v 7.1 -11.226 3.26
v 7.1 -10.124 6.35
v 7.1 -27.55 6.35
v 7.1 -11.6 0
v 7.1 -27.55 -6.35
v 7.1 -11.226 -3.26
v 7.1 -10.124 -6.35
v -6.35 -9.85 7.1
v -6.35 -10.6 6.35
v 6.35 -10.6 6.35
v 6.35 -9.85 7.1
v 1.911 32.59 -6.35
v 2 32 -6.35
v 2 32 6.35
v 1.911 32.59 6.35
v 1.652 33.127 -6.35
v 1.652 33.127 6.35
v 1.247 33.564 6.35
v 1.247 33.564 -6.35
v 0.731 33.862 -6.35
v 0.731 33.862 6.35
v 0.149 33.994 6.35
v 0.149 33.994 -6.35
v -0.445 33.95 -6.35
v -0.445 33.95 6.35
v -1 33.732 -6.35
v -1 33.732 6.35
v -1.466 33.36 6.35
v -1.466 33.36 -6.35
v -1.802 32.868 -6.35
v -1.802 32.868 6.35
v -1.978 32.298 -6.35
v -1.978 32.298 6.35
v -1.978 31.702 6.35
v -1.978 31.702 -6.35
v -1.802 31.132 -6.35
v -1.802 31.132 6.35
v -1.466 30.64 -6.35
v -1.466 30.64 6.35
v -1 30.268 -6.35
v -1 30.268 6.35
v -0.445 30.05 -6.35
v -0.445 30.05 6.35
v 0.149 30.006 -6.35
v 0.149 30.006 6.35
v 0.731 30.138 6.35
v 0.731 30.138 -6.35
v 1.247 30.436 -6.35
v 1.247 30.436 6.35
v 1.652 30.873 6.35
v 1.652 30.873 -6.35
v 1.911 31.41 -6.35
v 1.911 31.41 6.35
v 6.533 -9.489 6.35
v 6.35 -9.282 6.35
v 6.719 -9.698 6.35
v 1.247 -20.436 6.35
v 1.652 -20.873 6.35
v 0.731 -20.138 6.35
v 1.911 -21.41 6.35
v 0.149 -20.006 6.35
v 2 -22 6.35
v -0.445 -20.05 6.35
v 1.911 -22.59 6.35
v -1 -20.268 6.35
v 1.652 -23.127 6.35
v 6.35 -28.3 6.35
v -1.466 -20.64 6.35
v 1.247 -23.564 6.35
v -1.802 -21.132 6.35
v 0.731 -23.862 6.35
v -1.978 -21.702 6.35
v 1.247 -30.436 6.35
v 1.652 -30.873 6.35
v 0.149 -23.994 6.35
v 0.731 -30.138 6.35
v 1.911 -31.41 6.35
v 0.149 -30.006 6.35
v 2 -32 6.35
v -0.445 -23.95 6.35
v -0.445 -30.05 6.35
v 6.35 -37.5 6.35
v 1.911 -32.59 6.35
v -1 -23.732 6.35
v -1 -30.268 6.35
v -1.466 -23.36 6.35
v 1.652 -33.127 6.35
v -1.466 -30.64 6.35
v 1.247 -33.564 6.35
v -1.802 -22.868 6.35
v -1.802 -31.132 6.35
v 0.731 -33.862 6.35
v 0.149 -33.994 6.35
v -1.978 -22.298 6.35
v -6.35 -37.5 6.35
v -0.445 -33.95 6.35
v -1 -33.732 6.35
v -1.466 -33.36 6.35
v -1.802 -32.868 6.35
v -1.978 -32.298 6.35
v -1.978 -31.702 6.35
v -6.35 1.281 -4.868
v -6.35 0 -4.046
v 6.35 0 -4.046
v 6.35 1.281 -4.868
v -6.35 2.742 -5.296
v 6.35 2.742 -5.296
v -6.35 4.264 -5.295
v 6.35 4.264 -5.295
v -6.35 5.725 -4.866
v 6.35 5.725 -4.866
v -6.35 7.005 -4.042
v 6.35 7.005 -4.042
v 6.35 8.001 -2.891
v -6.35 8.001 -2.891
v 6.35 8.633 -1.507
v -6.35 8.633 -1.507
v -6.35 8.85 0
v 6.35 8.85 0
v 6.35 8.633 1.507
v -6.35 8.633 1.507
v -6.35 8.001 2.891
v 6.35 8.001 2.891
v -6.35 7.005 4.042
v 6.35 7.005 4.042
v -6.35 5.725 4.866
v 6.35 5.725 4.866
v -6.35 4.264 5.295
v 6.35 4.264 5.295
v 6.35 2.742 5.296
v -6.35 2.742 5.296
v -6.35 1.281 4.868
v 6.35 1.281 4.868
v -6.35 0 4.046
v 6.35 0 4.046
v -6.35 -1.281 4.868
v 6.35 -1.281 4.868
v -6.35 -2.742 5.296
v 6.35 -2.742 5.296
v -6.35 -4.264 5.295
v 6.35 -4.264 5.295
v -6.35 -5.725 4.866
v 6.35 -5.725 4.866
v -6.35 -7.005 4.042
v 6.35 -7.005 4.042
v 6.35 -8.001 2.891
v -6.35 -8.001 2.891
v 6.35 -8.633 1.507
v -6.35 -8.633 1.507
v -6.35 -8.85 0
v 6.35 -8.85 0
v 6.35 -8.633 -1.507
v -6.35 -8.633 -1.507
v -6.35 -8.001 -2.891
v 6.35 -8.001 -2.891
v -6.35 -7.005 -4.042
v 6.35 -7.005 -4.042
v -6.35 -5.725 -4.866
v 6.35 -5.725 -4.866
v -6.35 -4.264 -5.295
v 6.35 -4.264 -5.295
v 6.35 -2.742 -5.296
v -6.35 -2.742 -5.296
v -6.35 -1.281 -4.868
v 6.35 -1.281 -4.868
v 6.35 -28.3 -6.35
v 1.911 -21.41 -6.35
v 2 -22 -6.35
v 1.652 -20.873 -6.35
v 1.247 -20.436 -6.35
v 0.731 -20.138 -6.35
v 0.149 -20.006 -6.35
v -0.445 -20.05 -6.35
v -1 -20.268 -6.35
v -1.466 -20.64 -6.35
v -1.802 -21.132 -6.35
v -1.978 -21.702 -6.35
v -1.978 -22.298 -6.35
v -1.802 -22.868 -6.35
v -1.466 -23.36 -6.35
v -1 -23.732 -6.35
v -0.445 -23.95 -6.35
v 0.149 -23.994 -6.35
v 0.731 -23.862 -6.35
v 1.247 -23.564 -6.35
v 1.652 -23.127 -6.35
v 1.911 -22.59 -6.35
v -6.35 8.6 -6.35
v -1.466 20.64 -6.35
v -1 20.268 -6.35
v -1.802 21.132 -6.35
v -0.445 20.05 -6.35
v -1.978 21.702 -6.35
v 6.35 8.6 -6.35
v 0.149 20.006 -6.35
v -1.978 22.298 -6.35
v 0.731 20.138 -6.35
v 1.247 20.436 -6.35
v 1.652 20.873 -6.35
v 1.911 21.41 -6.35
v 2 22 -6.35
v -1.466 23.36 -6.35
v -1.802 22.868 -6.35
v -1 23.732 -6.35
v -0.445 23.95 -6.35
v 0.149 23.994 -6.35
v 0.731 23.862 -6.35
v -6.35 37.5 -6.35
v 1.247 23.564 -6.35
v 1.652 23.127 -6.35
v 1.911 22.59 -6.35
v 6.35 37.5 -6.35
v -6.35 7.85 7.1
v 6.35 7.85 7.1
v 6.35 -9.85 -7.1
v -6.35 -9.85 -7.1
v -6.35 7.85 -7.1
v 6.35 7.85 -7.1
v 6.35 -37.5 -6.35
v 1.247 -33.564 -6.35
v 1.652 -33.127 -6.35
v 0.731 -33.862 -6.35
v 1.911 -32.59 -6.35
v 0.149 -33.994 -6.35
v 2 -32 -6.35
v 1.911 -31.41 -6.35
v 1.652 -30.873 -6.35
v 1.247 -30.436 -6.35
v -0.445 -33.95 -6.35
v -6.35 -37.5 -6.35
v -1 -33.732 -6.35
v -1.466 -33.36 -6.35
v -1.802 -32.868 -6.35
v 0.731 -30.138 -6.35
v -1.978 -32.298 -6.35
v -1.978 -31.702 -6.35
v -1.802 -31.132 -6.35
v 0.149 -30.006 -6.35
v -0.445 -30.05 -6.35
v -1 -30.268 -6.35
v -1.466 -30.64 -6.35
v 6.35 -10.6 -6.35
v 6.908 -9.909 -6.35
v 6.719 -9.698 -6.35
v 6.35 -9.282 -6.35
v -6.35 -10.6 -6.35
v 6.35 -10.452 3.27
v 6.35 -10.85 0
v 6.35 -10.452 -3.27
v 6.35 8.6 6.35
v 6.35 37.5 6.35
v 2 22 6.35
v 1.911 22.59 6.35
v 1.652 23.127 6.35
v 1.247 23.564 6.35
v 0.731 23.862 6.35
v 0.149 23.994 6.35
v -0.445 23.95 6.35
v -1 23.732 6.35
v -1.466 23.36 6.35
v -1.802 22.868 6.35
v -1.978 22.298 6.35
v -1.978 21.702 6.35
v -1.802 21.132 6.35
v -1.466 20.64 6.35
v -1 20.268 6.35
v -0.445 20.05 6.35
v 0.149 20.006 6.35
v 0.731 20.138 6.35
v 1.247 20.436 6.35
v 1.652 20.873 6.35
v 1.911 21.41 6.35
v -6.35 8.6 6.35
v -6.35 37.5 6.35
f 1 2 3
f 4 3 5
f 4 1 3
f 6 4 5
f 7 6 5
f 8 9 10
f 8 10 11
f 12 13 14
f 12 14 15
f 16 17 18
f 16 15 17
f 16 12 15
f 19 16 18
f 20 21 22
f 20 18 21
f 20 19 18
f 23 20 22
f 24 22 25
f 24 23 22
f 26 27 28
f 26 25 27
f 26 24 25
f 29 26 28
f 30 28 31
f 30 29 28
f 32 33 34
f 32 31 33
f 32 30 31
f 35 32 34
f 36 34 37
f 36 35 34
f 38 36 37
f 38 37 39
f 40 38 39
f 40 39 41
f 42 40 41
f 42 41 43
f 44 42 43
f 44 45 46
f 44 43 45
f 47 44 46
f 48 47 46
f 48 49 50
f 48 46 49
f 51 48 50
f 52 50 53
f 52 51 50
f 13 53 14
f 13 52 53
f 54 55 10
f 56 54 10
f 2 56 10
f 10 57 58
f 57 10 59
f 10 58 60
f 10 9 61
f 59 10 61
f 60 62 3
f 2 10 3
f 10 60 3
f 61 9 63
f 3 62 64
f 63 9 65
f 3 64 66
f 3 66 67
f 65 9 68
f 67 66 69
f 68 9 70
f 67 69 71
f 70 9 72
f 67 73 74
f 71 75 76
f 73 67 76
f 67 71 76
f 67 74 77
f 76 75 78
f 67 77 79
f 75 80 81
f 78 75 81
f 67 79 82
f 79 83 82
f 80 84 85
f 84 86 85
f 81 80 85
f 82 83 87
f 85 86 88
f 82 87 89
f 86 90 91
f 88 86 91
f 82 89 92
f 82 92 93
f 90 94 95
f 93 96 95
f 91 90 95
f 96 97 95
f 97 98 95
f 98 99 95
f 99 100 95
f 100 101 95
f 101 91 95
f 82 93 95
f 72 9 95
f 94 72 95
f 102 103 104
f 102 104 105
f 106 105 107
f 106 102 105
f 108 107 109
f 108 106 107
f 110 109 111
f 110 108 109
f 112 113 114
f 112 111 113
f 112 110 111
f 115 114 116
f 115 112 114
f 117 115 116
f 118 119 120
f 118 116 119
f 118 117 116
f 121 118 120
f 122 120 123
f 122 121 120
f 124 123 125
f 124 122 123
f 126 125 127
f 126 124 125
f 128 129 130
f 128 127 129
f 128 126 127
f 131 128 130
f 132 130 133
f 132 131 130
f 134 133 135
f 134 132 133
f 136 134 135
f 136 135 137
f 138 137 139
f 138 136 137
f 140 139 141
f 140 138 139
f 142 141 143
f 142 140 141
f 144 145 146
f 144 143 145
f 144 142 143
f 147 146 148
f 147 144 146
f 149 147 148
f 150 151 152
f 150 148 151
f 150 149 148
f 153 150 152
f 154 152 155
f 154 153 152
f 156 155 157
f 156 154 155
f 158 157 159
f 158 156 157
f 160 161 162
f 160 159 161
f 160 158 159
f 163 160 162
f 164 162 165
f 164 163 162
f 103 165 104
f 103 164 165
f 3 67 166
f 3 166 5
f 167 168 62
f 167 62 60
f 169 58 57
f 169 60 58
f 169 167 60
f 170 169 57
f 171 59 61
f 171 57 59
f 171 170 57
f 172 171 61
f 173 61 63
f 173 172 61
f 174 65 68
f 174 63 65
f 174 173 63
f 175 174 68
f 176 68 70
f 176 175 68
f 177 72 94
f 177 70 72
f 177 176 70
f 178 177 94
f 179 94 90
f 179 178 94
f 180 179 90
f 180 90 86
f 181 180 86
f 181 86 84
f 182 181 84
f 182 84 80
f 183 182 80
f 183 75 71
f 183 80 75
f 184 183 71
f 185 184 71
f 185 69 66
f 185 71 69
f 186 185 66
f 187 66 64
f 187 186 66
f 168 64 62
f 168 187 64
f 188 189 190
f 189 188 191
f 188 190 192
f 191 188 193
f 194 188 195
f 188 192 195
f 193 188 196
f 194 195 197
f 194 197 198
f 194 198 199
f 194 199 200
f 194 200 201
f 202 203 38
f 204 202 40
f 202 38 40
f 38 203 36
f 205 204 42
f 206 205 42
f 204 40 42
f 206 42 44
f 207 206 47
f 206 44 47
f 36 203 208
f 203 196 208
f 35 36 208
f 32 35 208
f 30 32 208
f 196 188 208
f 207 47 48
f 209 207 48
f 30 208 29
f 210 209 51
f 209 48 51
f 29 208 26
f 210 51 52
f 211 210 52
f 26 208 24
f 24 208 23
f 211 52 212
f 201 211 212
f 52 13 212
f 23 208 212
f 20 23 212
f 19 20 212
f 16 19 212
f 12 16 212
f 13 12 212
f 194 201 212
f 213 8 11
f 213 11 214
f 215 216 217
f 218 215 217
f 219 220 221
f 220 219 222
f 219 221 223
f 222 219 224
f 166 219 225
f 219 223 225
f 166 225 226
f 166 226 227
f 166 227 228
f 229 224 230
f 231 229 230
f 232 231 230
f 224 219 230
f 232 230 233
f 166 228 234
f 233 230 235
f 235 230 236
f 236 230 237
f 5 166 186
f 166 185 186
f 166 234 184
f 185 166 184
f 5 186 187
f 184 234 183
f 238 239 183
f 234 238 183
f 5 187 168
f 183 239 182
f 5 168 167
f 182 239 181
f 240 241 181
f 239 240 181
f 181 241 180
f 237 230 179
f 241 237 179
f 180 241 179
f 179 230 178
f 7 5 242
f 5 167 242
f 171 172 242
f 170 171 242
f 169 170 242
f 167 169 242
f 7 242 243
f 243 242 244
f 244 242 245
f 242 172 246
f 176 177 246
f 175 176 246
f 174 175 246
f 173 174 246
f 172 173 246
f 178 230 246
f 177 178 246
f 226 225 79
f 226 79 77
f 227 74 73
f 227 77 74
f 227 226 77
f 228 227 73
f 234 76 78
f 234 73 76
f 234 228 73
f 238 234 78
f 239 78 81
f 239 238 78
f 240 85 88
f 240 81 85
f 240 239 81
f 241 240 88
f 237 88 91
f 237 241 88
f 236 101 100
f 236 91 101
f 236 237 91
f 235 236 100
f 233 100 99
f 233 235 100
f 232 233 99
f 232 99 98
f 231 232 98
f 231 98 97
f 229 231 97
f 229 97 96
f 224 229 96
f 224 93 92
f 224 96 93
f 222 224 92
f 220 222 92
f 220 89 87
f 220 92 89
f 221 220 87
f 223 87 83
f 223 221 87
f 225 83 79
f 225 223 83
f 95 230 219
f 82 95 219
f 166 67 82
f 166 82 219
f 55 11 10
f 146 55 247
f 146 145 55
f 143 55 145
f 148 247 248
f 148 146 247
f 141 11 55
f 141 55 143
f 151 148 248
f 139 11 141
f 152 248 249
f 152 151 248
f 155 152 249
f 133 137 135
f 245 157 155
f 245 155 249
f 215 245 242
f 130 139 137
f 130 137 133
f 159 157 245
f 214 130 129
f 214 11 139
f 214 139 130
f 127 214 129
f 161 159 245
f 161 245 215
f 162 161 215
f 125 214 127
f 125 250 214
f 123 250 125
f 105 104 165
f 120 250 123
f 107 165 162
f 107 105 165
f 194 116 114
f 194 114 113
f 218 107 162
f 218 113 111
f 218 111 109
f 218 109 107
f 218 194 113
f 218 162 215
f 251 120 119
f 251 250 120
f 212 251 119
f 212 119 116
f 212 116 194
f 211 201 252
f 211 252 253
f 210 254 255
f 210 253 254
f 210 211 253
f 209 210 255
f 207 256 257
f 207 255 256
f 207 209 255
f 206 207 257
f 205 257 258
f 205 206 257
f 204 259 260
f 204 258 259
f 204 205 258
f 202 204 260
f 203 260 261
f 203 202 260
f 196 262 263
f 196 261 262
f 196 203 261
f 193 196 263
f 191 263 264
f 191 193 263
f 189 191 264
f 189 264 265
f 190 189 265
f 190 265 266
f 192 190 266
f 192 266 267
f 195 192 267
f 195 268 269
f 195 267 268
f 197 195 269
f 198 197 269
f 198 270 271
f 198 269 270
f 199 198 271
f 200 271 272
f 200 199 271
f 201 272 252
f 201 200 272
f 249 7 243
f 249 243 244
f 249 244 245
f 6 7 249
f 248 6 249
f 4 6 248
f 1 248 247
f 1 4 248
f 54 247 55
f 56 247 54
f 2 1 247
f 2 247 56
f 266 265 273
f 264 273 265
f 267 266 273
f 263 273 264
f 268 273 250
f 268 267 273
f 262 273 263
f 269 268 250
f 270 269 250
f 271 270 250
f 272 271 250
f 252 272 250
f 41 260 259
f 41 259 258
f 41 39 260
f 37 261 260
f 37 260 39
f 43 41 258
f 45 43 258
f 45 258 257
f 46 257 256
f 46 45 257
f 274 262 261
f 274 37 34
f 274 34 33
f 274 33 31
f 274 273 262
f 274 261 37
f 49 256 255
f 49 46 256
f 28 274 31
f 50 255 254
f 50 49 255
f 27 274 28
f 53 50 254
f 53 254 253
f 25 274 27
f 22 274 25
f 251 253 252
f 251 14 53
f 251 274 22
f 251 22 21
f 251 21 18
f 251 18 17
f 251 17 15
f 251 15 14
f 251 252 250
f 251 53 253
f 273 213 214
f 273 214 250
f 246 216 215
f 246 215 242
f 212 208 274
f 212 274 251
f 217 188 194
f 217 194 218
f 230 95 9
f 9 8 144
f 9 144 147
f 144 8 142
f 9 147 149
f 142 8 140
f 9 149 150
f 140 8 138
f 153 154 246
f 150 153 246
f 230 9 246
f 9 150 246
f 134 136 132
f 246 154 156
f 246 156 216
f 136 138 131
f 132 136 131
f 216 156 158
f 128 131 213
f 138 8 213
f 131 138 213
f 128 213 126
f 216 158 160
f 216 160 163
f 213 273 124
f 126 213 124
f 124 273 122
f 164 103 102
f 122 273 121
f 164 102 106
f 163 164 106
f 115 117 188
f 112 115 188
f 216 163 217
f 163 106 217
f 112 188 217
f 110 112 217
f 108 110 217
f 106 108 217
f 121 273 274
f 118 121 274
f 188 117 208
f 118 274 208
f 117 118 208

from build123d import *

# Parameters (mm, degrees)
SKETCH1_W               = 12.7
SKETCH1_H               = 12.7
BOSS_EXTRUDE1_DEPTH     = 37.5
CUT_EXTRUDE1_DEPTH      = 39.560277489
CUT_EXTRUDE1_DEPTH_BACK = 39.560277489
BOSS_EXTRUDE2_START     = -6.35
SKETCH3_W               = 0.75
SKETCH3_H               = 21.7
BOSS_EXTRUDE2_DEPTH     = 12.7
BOSS_EXTRUDE3_DEPTH     = 0.75
CHAMFER1_SIZE           = 2
CUT_EXTRUDE2_DEPTH      = 39.820999472
CUT_EXTRUDE2_DEPTH_BACK = 39.820999472
SKETCH5_R               = 2


with BuildPart() as part:
    # Sketch1 → Boss-Extrude1 (new, symmetric)
    with BuildSketch(Plane(origin=(0, 0, 0), x_dir=(1, 0, 0), z_dir=(0, 1, 0))):
        Rectangle(SKETCH1_W, SKETCH1_H)
    extrude(amount=BOSS_EXTRUDE1_DEPTH, both=True)

    # Sketch2 → Cut-Extrude1 (cut, two sides: drawn at the far end of the back side and taken through both)
    with BuildSketch(Plane(origin=(0, 0, 0), x_dir=(0, 0, -1), z_dir=(1, 0, 0)).offset(-CUT_EXTRUDE1_DEPTH_BACK)):
        with BuildLine():
            ThreePointArc((4.046294601, 0), (0, 8.85), (-4.046294601, 0))
            ThreePointArc((-4.046294601, 0), (0, -8.85), (4.046294601, 0))
        make_face()
    extrude(amount=CUT_EXTRUDE1_DEPTH + CUT_EXTRUDE1_DEPTH_BACK, mode=Mode.SUBTRACT)

    # Sketch3 → Boss-Extrude2 (add)
    with BuildSketch(Plane(origin=(0, 0, 0), x_dir=(0, 0, -1), z_dir=(1, 0, 0)).offset(BOSS_EXTRUDE2_START)):
        with Locations((6.725, -1)):
            Rectangle(SKETCH3_W, SKETCH3_H)
        with Locations((-6.725, -1)):
            Rectangle(SKETCH3_W, SKETCH3_H)
    extrude(amount=BOSS_EXTRUDE2_DEPTH)

    # Sketch4 → Boss-Extrude3 (add)
    with BuildSketch(Plane(origin=(6.35, 0, 0), x_dir=(0, 0, -1), z_dir=(1, 0, 0))):
        with BuildLine():
            Line((-6.35, -7.85), (-6.35, -29.55))
            Line((-6.35, -29.55), (6.35, -29.55))
            Line((6.35, -29.55), (6.35, -7.85))
            ThreePointArc((6.35, -7.85), (0, -9.6), (-6.35, -7.85))
        make_face()
    extrude(amount=BOSS_EXTRUDE3_DEPTH)

    # Chamfer1
    # the kernel refuses this chamfer: 2 mm, written as the material it takes off along each edge
    with BuildSketch(Plane(origin=(7.1, -29.55, 11.493365976), x_dir=(-0.9996219169112968, -0.027495876610585623, 0), z_dir=(0, 0, -1))) as chamfer1_piece_1_section:
        Polygon((CHAMFER1_SIZE * 0.999621916911, CHAMFER1_SIZE * 0.0274958766106), (-CHAMFER1_SIZE * 0.0274958766106, CHAMFER1_SIZE * 0.999621916911), (0, 0), align=None)
    chamfer1_piece_1 = extrude(amount=22.986731952, mode=Mode.PRIVATE)
    chamfer1_piece_1 = split(chamfer1_piece_1, bisect_by=Plane(origin=(6.35, -28.711332072, 0), z_dir=(1, 0, 0)), keep=Keep.TOP, mode=Mode.PRIVATE)
    add(chamfer1_piece_1, mode=Mode.SUBTRACT)
    with BuildSketch(Plane(origin=(7.1, 2.795714286, 0), x_dir=(0, -0.5793710900712427, -0.8150638870601863), z_dir=(0, 0.8150638870601863, -0.5793710900712427))) as chamfer1_piece_2_section:
        Polygon((12.395714286, CHAMFER1_SIZE), (12.395714286 + CHAMFER1_SIZE, 0), (12.395714286, 0), align=None)
    chamfer1_piece_2 = revolve(axis=Axis((7.1, 2.795714286, 0), (-1, 0, 0)), revolution_arc=109.187358772, mode=Mode.PRIVATE)
    chamfer1_piece_2 = split(chamfer1_piece_2, bisect_by=Plane(origin=(6.35, -11.230390822, 0), z_dir=(1, 0, 0)), keep=Keep.TOP, mode=Mode.PRIVATE)
    add(chamfer1_piece_2, mode=Mode.SUBTRACT)
    with BuildSketch(Plane(origin=(-11.493365976, -11.85, -7.1), x_dir=(0, 0.9996219169112968, -0.027495876610586487), z_dir=(1, 0, 0))) as chamfer1_piece_3_section:
        Polygon((CHAMFER1_SIZE * 0.999621916911, CHAMFER1_SIZE * 0.0274958766106), (-CHAMFER1_SIZE * 0.0274958766106, CHAMFER1_SIZE * 0.999621916911), (0, 0), align=None)
    chamfer1_piece_3 = extrude(amount=22.986731952, mode=Mode.PRIVATE)
    chamfer1_piece_3 = split(chamfer1_piece_3, bisect_by=Plane(origin=(0, -11.011332072, -6.35), z_dir=(0, 0, -1)), keep=Keep.TOP, mode=Mode.PRIVATE)
    add(chamfer1_piece_3, mode=Mode.SUBTRACT)
    with BuildSketch(Plane(origin=(-11.493365976, 9.85, -7.1), x_dir=(0, 0.027495876610586487, 0.9996219169112968), z_dir=(1, 0, 0))) as chamfer1_piece_4_section:
        Polygon((CHAMFER1_SIZE * 0.999621916911, CHAMFER1_SIZE * 0.0274958766106), (-CHAMFER1_SIZE * 0.0274958766106, CHAMFER1_SIZE * 0.999621916911), (0, 0), align=None)
    chamfer1_piece_4 = extrude(amount=22.986731952, mode=Mode.PRIVATE)
    chamfer1_piece_4 = split(chamfer1_piece_4, bisect_by=Plane(origin=(0, 9.011332072, -6.35), z_dir=(0, 0, -1)), keep=Keep.TOP, mode=Mode.PRIVATE)
    add(chamfer1_piece_4, mode=Mode.SUBTRACT)
    with BuildSketch(Plane(origin=(-11.493365976, 9.85, 7.1), x_dir=(0, -0.9996219169112968, 0.027495876610586497), z_dir=(1, 0, 0))) as chamfer1_piece_5_section:
        Polygon((CHAMFER1_SIZE * 0.999621916911, CHAMFER1_SIZE * 0.0274958766106), (-CHAMFER1_SIZE * 0.0274958766106, CHAMFER1_SIZE * 0.999621916911), (0, 0), align=None)
    chamfer1_piece_5 = extrude(amount=22.986731952, mode=Mode.PRIVATE)
    chamfer1_piece_5 = split(chamfer1_piece_5, bisect_by=Plane(origin=(0, 9.011332072, 6.35), z_dir=(0, 0, 1)), keep=Keep.TOP, mode=Mode.PRIVATE)
    add(chamfer1_piece_5, mode=Mode.SUBTRACT)
    with BuildSketch(Plane(origin=(-11.493365976, -11.85, 7.1), x_dir=(0, -0.027495876610586487, -0.9996219169112968), z_dir=(1, 0, 0))) as chamfer1_piece_6_section:
        Polygon((CHAMFER1_SIZE * 0.999621916911, CHAMFER1_SIZE * 0.0274958766106), (-CHAMFER1_SIZE * 0.0274958766106, CHAMFER1_SIZE * 0.999621916911), (0, 0), align=None)
    chamfer1_piece_6 = extrude(amount=22.986731952, mode=Mode.PRIVATE)
    chamfer1_piece_6 = split(chamfer1_piece_6, bisect_by=Plane(origin=(0, -11.011332072, 6.35), z_dir=(0, 0, 1)), keep=Keep.TOP, mode=Mode.PRIVATE)
    add(chamfer1_piece_6, mode=Mode.SUBTRACT)

    # Sketch5 → Cut-Extrude2 (cut, two sides: drawn at the far end of the back side and taken through both)
    with BuildSketch(Plane.XY.offset(-CUT_EXTRUDE2_DEPTH_BACK)):
        with Locations((0, 32)):
            Circle(SKETCH5_R)
        with Locations((0, 22)):
            Circle(SKETCH5_R)
        with Locations((0, -32)):
            Circle(SKETCH5_R)
        with Locations((0, -22)):
            Circle(SKETCH5_R)
    extrude(amount=CUT_EXTRUDE2_DEPTH + CUT_EXTRUDE2_DEPTH_BACK, mode=Mode.SUBTRACT)


solid = part.part
